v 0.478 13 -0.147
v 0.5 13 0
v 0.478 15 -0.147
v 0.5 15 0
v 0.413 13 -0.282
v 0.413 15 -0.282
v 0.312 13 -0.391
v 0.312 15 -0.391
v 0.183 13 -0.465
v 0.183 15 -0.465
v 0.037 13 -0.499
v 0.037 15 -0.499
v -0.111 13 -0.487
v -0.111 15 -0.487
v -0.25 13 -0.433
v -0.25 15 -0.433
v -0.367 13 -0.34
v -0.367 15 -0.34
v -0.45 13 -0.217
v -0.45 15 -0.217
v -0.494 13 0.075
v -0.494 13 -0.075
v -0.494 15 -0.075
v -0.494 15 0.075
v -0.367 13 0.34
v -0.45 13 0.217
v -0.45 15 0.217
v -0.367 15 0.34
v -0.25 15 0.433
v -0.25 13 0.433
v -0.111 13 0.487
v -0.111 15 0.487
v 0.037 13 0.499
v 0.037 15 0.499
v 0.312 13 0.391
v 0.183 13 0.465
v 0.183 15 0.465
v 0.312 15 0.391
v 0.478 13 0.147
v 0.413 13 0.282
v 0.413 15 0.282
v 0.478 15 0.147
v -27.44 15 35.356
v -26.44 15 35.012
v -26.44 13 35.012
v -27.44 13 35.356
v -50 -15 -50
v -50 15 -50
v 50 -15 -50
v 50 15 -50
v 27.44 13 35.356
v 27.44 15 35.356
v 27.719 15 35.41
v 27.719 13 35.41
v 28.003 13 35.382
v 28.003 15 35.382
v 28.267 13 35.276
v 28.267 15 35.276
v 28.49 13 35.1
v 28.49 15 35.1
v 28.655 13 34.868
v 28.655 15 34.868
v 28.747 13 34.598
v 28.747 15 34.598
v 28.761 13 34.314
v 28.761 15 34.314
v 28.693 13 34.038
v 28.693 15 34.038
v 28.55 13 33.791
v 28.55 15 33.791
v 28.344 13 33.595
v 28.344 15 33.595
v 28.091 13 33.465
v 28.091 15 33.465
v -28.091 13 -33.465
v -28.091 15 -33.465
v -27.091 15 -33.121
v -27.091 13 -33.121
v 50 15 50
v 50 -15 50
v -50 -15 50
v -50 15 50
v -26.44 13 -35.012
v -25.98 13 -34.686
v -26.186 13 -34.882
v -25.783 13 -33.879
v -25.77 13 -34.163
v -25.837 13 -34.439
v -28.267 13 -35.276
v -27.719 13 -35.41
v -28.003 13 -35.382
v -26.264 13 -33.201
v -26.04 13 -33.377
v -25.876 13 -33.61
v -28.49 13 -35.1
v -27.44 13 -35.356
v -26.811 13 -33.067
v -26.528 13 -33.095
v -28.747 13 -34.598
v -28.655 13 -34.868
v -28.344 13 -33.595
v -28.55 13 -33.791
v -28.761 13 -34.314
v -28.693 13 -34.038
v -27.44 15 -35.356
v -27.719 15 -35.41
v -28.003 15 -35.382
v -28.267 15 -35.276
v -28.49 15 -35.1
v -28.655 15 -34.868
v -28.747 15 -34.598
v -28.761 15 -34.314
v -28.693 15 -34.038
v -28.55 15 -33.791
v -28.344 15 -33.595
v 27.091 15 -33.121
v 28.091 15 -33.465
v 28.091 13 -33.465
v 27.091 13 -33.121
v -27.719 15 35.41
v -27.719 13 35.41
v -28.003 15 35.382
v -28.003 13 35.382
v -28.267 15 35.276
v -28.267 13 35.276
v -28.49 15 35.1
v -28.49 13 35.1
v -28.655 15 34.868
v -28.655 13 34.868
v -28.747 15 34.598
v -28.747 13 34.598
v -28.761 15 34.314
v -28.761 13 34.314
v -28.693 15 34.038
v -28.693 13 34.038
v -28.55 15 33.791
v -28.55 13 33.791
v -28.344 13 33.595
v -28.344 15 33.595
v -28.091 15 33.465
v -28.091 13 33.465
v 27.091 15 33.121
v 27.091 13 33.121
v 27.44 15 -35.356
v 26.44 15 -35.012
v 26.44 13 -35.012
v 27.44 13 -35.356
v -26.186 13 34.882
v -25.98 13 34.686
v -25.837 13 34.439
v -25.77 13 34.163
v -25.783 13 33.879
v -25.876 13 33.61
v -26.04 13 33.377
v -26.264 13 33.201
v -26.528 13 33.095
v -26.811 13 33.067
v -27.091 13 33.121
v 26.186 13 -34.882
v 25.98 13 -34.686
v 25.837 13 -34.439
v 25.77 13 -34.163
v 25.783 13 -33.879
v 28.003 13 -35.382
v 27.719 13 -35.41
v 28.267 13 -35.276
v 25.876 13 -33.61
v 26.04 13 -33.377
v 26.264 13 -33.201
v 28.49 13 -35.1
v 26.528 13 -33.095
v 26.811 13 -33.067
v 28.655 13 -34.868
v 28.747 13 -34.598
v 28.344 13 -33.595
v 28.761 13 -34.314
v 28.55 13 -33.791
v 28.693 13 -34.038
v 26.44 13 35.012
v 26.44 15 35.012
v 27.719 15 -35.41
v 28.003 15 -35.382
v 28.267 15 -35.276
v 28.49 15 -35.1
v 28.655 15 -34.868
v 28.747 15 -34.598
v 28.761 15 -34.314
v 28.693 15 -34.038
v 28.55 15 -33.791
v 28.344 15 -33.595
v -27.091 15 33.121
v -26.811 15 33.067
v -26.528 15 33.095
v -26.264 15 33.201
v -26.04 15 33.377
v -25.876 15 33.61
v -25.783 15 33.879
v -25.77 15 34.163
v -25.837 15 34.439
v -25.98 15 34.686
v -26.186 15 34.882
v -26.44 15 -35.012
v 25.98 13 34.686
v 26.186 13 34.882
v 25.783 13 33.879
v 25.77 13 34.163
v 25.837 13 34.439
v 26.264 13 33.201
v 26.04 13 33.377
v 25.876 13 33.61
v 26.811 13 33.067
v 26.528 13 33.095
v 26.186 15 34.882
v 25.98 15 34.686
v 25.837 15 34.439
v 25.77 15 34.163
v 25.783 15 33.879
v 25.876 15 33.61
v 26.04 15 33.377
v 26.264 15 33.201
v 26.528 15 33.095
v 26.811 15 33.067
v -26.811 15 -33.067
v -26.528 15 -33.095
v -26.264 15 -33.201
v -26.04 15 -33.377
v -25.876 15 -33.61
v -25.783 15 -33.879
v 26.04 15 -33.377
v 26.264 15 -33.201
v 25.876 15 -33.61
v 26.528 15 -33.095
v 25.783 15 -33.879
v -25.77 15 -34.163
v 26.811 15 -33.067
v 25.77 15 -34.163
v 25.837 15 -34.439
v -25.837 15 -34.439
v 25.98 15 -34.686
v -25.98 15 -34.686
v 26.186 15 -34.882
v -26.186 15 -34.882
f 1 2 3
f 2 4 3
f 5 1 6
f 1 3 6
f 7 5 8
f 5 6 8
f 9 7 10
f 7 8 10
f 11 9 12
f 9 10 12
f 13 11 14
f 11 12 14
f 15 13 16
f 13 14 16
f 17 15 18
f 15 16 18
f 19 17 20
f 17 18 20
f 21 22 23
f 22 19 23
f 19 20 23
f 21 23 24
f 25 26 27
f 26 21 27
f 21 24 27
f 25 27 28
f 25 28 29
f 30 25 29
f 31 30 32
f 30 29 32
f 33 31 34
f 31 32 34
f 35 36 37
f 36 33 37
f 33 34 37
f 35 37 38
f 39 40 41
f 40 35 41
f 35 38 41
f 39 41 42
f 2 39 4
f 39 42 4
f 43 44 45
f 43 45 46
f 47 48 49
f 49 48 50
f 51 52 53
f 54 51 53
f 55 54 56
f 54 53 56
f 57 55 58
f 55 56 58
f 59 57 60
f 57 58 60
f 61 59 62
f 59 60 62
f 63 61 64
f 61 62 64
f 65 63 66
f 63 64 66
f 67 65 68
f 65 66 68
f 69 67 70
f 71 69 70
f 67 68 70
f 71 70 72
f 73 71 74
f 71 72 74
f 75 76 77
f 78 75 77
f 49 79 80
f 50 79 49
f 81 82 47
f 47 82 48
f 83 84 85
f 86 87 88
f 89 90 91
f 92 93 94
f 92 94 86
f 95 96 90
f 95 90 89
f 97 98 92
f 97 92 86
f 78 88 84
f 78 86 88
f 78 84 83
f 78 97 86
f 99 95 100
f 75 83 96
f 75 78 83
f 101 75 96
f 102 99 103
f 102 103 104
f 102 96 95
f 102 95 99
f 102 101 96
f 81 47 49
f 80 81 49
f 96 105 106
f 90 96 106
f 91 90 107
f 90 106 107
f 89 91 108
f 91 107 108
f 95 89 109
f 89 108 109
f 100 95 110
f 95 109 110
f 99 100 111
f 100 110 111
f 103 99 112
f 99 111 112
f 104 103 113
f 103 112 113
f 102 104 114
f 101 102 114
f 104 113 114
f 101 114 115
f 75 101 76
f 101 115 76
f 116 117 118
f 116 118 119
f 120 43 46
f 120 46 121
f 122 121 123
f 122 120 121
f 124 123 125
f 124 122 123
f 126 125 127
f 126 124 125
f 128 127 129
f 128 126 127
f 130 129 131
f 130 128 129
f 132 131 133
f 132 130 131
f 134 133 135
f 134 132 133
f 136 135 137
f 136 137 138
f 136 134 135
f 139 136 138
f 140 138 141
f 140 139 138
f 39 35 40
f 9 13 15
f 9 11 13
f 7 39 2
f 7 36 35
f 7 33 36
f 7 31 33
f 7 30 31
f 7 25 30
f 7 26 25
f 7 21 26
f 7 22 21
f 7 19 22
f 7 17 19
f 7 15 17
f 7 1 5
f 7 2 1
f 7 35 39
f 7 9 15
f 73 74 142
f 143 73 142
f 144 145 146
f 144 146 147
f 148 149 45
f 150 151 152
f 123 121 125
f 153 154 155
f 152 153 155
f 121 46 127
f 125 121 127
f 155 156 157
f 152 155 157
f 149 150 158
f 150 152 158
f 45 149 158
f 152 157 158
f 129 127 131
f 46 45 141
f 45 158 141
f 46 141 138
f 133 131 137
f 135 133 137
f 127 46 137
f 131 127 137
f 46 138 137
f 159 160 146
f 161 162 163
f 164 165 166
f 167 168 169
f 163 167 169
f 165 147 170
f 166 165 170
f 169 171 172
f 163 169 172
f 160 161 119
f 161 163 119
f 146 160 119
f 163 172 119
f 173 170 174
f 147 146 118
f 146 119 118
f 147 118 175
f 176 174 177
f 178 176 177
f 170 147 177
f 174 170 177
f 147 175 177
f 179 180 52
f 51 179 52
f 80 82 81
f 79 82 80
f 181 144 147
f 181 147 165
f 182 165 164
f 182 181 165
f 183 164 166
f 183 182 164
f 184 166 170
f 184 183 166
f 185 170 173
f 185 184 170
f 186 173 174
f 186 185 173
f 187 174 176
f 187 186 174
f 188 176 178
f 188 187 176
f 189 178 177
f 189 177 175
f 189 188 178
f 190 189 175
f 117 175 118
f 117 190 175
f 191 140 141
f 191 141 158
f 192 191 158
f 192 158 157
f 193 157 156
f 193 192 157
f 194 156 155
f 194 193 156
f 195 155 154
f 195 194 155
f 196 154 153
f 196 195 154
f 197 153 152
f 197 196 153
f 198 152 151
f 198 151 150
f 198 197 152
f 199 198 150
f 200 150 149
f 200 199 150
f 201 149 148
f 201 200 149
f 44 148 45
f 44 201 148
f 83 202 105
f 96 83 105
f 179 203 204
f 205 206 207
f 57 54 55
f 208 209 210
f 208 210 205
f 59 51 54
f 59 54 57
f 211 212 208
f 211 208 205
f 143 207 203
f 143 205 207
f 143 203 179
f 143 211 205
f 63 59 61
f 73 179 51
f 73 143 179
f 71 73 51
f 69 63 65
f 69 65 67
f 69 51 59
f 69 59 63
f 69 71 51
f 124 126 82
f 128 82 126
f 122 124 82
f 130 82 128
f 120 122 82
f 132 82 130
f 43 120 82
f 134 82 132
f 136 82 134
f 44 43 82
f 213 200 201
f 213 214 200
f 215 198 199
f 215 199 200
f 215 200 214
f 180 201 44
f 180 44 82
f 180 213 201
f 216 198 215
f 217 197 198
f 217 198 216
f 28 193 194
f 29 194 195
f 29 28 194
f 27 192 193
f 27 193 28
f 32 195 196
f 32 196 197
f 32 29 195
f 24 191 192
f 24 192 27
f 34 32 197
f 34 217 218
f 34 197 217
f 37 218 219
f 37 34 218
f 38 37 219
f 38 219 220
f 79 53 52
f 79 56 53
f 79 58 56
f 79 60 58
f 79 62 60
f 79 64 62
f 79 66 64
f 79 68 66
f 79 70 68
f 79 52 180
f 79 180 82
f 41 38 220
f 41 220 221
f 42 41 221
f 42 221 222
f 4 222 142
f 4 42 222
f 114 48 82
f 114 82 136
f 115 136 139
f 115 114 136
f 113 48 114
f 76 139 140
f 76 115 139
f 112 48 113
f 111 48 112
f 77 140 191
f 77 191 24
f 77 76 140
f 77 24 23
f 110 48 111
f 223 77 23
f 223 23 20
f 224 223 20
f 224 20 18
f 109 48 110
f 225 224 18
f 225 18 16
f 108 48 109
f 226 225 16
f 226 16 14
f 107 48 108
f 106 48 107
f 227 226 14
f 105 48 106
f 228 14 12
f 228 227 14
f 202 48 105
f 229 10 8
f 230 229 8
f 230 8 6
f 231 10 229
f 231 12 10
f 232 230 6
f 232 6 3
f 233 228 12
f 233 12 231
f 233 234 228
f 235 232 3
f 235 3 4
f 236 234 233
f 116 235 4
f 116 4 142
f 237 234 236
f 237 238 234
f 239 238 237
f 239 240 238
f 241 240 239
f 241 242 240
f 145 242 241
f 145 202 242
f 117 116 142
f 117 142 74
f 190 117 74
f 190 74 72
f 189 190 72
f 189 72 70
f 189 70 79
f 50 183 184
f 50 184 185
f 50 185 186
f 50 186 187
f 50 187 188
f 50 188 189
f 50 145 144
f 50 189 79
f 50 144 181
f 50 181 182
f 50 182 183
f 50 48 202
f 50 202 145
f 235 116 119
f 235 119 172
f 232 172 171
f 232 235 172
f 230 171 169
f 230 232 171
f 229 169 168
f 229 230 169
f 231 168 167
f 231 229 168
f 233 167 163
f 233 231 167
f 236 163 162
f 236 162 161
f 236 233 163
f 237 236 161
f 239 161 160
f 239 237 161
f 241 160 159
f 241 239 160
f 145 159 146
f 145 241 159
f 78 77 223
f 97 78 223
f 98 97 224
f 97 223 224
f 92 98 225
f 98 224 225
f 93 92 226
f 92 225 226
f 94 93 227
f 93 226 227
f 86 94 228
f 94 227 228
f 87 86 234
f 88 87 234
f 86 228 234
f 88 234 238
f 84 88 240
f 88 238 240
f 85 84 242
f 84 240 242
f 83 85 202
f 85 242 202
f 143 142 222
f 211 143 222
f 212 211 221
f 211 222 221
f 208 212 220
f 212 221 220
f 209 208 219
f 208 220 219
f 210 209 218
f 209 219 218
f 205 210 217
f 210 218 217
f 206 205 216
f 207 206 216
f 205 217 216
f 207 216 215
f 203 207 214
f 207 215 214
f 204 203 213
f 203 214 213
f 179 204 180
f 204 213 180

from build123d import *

# Parameters (mm, degrees)
SKETCH1_W                                  = 100
SKETCH1_H                                  = 100
BOSS_EXTRUDE1_DEPTH                        = 15
SKETCH2_R                                  = 0.5
CUT_EXTRUDE1_DEPTH                         = 2
MIRROR1_AT_THE_SECOND_PLANE_COPY_1_SKETC_R = 0.5
MIRROR1_AT_THE_SECOND_PLANE_COPY_1_DEPTH   = 2


with BuildPart() as part:
    # Sketch1 → Boss-Extrude1 (new body, symmetric)
    with BuildSketch(Plane(origin=(0, 0, 0), x_dir=(1, 0, 0), z_dir=(0, 1, 0))):
        Rectangle(SKETCH1_W, SKETCH1_H)
    extrude(amount=BOSS_EXTRUDE1_DEPTH, both=True)

    # Sketch2 → Cut-Extrude1 (cut)
    with BuildSketch(Plane(origin=(0, 15, 0), x_dir=(1, 0, 0), z_dir=(0, 1, 0))):
        Circle(SKETCH2_R)
        with BuildLine():
            Line((-28.090825198, -33.465171233), (-27.090825198, -33.120843619))
            ThreePointArc((-27.090825198, -33.120843619), (-25.819738468, -33.740794041), (-26.439688889, -35.011880771))
            Line((-26.439688889, -35.011880771), (-27.439688889, -35.356208384))
            ThreePointArc((-27.439688889, -35.356208384), (-28.710775619, -34.736257963), (-28.090825198, -33.465171233))
        make_face()
    cut_extrude1 = extrude(amount=-CUT_EXTRUDE1_DEPTH, mode=Mode.SUBTRACT)

    # Mirror1: Cut-Extrude1 across plane
    add(cut_extrude1.mirror(Plane.XY), mode=Mode.SUBTRACT)

    # Mirror1 at the second plane: Cut-Extrude1 across plane
    add(cut_extrude1.mirror(Plane(origin=(0, 0, 0), x_dir=(0, 0, 1), z_dir=(1, 0, 0))), mode=Mode.SUBTRACT)

    # Mirror1 at the second plane copy 1 sketc → Mirror1 at the second plane copy 1 (cut)
    with BuildSketch(Plane(origin=(0, 15, 0), x_dir=(-1, 0, 0), z_dir=(0, 1, 0))):
        Circle(MIRROR1_AT_THE_SECOND_PLANE_COPY_1_SKETC_R)
        with BuildLine():
            Line((-28.090825198, -33.465171233), (-27.090825198, -33.120843619))
            ThreePointArc((-27.090825198, -33.120843619), (-25.819738468, -33.740794041), (-26.439688889, -35.011880771))
            Line((-26.439688889, -35.011880771), (-27.439688889, -35.356208384))
            ThreePointArc((-27.439688889, -35.356208384), (-28.710775619, -34.736257963), (-28.090825198, -33.465171233))
        make_face()
    extrude(amount=-MIRROR1_AT_THE_SECOND_PLANE_COPY_1_DEPTH, mode=Mode.SUBTRACT)


solid = part.part
